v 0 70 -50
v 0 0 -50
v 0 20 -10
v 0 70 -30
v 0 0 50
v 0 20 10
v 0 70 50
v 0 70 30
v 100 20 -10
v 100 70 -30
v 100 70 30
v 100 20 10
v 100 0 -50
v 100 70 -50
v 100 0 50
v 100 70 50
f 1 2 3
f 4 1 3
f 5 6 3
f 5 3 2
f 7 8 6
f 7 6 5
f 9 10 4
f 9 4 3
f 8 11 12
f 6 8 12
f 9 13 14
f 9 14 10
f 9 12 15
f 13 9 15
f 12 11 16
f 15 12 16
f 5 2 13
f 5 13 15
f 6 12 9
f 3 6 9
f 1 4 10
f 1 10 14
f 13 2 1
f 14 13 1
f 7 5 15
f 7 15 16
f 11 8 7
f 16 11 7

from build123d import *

# Parameters (mm, degrees)
SKETCH1_W           = 50
SKETCH1_H           = 70
BOSS_EXTRUDE1_DEPTH = 100
CUT_EXTRUDE1_DEPTH  = 100


with BuildPart() as part:
    # Sketch1 → Boss-Extrude1 (new body)
    with BuildSketch(Plane(origin=(0, 0, 0), x_dir=(0, 0, -1), z_dir=(1, 0, 0))):
        with Locations((25, 35)):
            Rectangle(SKETCH1_W, SKETCH1_H)
    extrude(amount=BOSS_EXTRUDE1_DEPTH)

    # Sketch2 → Cut-Extrude1 (cut)
    with BuildSketch(Plane(origin=(100, 0, 0), x_dir=(0, 0, -1), z_dir=(1, 0, 0))):
        Polygon((0, 70), (30, 70), (10, 20), (0, 20), align=None)
    extrude(amount=-CUT_EXTRUDE1_DEPTH, mode=Mode.SUBTRACT)

    # Mirror1: part across plane


with BuildPart() as part_1:
    add(part.part)
    add(part.part.mirror(Plane.XY))


solid = part_1.part
